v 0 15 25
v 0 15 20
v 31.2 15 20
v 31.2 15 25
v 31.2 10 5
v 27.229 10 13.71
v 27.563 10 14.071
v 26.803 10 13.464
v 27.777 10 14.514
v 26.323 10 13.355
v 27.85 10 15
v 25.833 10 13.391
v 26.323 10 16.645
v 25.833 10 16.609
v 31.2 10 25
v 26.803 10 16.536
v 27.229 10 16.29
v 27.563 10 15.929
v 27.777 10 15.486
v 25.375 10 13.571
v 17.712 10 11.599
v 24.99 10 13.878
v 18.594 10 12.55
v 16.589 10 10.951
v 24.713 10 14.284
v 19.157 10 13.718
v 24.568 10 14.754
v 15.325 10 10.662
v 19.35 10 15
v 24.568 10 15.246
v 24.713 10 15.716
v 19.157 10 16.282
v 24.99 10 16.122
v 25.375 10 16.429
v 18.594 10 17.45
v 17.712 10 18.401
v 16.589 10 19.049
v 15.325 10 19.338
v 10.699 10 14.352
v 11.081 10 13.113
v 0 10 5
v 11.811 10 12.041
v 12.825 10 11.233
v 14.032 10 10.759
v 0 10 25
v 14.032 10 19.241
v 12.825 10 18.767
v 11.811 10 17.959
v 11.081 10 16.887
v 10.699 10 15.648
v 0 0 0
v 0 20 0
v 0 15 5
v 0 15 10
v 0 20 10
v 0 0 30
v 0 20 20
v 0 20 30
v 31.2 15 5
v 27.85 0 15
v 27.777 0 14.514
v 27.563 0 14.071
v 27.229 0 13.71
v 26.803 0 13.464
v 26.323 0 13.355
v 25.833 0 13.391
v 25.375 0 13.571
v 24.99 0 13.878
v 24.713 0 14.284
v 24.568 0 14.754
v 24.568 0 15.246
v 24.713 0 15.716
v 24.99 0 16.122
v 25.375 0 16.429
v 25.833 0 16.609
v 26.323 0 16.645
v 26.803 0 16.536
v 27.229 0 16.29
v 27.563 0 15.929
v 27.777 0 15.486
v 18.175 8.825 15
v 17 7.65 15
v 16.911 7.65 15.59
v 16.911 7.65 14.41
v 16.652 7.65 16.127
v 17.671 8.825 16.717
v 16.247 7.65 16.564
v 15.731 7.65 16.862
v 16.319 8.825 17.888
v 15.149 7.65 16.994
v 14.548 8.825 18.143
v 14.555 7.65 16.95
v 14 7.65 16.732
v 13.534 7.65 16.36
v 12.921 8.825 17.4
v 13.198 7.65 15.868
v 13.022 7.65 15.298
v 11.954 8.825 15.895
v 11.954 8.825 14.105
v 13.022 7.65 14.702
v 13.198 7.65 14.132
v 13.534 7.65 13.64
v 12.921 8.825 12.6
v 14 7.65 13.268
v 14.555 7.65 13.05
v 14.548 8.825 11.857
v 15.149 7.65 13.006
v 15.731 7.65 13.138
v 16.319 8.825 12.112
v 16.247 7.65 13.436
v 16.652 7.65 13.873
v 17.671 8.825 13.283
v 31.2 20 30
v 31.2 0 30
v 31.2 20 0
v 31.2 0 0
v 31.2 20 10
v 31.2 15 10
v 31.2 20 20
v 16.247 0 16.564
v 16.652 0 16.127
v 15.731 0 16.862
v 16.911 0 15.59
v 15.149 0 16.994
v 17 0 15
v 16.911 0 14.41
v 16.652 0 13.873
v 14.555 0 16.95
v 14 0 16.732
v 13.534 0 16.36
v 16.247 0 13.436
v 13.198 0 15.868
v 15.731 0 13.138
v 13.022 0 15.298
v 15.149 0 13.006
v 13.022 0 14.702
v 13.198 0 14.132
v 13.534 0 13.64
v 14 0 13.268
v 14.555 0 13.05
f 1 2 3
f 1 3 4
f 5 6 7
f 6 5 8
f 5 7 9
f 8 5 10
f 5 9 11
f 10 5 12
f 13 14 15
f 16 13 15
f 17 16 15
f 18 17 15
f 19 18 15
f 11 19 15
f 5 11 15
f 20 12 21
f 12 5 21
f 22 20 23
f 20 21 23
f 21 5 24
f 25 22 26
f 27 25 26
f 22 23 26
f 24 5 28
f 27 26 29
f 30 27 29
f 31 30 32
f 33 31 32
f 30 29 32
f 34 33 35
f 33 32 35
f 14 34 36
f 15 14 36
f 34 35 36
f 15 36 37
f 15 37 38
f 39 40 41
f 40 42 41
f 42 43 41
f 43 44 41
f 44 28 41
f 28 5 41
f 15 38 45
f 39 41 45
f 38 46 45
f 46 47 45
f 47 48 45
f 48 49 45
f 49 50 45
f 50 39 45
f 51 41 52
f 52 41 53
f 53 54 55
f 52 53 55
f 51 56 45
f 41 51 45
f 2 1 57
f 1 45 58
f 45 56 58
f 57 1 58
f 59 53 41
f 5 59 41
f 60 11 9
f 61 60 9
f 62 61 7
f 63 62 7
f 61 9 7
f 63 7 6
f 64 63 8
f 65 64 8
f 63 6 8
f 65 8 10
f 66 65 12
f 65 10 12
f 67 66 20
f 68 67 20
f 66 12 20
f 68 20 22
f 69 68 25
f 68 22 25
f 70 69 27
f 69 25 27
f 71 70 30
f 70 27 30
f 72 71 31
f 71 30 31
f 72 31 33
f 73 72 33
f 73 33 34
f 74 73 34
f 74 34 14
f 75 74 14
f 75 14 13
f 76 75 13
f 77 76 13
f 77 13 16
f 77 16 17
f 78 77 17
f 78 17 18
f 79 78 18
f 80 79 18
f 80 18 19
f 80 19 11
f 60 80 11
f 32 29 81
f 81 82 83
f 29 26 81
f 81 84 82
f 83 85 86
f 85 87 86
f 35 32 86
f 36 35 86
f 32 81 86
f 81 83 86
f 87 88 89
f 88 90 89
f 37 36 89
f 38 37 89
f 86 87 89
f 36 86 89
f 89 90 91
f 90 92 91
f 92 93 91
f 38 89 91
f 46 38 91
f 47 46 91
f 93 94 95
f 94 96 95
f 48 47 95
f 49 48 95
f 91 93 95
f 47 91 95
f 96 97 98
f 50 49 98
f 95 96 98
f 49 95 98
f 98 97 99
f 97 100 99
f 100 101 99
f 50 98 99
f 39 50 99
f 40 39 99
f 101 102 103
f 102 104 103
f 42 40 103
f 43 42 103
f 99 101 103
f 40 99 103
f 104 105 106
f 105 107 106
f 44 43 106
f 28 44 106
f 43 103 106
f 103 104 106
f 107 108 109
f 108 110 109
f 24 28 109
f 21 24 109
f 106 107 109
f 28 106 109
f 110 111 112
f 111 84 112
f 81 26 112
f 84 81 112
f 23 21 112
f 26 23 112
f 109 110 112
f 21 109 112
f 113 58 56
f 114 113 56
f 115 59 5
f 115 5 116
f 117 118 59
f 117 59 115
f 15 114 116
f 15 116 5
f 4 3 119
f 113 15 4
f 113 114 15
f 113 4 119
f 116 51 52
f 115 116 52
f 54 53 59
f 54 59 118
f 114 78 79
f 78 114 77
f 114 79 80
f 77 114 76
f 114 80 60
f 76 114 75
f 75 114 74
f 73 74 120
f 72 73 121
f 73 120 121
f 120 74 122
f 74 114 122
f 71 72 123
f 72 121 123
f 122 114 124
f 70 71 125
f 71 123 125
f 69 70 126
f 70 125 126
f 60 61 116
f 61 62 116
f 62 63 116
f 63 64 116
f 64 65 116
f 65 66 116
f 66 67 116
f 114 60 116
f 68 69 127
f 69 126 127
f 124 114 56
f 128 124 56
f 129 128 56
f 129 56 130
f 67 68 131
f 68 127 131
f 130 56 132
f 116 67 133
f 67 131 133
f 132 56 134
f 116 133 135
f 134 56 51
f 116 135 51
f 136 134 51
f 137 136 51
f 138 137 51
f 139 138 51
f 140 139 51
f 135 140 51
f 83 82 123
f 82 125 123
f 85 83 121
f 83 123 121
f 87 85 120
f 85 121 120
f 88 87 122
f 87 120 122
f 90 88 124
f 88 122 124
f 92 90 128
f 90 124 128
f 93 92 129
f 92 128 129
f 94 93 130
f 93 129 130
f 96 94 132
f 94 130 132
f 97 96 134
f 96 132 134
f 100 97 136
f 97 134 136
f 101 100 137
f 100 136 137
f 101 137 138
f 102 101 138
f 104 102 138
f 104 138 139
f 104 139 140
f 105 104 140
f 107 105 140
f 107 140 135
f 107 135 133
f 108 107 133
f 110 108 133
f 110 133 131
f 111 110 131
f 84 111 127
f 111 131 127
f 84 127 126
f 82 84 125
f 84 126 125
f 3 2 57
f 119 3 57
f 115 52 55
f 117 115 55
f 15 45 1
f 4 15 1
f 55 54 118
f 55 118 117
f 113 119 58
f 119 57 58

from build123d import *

# Parameters (mm, degrees)
F0_W           = 5
F0_H           = 5
F1_DEPTH       = 200
F3_DEPTH       = 1.2
F5_D           = 4
F5_CSINK_D     = 8.7
F5_CSINK_ANGLE = 90
F6_DEPTH       = 170
F8_DEPTH       = 25


with BuildPart() as f1:
    # F0 (on Right) → F1 (new body)
    with BuildSketch(Plane.YZ):
        Polygon((0, 30), (0, 15), (6.1031254008, 15), (10, 15), (10, 25), (15, 25), (20, 25), (20, 30), align=None)
        with Locations((17.5, 22.5)):
            Rectangle(F0_W, F0_H)
        with Locations((17.5, 7.5)):
            Rectangle(F0_W, F0_H)
        Polygon((0, 15), (0, 0), (20, 0), (20, 5), (15, 5), (10, 5), (10, 15), (6.1031254008, 15), align=None)
    extrude(amount=F1_DEPTH)

    # F2 (on face) → F3 (join)
    with BuildSketch(Plane.YZ.offset(200)):
        Polygon((20, 30), (0, 30), (0, 0), (20, 0), (20, 10), (15, 10), (15, 5), (10, 5), (10, 25), (15, 25), (15, 20), (20, 20), align=None)
        Polygon((20, 10), (20, 20), (15, 20), (15, 25), (10, 25), (10, 5), (15, 5), (15, 10), align=None)
    extrude(amount=F3_DEPTH)

    # F5 (through all)
    with Locations(Plane(origin=(0, 10, 0), x_dir=(-1, 0, 0), z_dir=(0, 1, 0))):
        with Locations((-15, 15), (-185, 15), (-100, 15)):
            CounterSinkHole(F5_D / 2, F5_CSINK_D / 2, counter_sink_angle=F5_CSINK_ANGLE)

    # F6 (cut): a face of the model
    f6_faces = [f1.faces().sort_by_distance(p)[0] for p in [
        (201.2, 10, 15),
    ]]
    extrude(f6_faces, amount=-F6_DEPTH, mode=Mode.SUBTRACT)

    # F7 (on face) → F8 (cut)
    with BuildSketch(Plane(origin=(0, 10, 0), x_dir=(-1, 0, 0), z_dir=(0, 1, 0))):
        with BuildLine():
            ThreePointArc((-27.85, 15), (-26.2, 13.35), (-24.55, 15))
            ThreePointArc((-24.55, 15), (-26.2, 16.65), (-27.85, 15))
        make_face()
        with BuildLine():
            ThreePointArc((-24.55, 15), (-26.2, 16.65), (-27.85, 15))
            ThreePointArc((-27.85, 15), (-26.2, 13.35), (-24.55, 15))
        make_face()
    extrude(amount=-F8_DEPTH, mode=Mode.SUBTRACT)


solid = f1.part
